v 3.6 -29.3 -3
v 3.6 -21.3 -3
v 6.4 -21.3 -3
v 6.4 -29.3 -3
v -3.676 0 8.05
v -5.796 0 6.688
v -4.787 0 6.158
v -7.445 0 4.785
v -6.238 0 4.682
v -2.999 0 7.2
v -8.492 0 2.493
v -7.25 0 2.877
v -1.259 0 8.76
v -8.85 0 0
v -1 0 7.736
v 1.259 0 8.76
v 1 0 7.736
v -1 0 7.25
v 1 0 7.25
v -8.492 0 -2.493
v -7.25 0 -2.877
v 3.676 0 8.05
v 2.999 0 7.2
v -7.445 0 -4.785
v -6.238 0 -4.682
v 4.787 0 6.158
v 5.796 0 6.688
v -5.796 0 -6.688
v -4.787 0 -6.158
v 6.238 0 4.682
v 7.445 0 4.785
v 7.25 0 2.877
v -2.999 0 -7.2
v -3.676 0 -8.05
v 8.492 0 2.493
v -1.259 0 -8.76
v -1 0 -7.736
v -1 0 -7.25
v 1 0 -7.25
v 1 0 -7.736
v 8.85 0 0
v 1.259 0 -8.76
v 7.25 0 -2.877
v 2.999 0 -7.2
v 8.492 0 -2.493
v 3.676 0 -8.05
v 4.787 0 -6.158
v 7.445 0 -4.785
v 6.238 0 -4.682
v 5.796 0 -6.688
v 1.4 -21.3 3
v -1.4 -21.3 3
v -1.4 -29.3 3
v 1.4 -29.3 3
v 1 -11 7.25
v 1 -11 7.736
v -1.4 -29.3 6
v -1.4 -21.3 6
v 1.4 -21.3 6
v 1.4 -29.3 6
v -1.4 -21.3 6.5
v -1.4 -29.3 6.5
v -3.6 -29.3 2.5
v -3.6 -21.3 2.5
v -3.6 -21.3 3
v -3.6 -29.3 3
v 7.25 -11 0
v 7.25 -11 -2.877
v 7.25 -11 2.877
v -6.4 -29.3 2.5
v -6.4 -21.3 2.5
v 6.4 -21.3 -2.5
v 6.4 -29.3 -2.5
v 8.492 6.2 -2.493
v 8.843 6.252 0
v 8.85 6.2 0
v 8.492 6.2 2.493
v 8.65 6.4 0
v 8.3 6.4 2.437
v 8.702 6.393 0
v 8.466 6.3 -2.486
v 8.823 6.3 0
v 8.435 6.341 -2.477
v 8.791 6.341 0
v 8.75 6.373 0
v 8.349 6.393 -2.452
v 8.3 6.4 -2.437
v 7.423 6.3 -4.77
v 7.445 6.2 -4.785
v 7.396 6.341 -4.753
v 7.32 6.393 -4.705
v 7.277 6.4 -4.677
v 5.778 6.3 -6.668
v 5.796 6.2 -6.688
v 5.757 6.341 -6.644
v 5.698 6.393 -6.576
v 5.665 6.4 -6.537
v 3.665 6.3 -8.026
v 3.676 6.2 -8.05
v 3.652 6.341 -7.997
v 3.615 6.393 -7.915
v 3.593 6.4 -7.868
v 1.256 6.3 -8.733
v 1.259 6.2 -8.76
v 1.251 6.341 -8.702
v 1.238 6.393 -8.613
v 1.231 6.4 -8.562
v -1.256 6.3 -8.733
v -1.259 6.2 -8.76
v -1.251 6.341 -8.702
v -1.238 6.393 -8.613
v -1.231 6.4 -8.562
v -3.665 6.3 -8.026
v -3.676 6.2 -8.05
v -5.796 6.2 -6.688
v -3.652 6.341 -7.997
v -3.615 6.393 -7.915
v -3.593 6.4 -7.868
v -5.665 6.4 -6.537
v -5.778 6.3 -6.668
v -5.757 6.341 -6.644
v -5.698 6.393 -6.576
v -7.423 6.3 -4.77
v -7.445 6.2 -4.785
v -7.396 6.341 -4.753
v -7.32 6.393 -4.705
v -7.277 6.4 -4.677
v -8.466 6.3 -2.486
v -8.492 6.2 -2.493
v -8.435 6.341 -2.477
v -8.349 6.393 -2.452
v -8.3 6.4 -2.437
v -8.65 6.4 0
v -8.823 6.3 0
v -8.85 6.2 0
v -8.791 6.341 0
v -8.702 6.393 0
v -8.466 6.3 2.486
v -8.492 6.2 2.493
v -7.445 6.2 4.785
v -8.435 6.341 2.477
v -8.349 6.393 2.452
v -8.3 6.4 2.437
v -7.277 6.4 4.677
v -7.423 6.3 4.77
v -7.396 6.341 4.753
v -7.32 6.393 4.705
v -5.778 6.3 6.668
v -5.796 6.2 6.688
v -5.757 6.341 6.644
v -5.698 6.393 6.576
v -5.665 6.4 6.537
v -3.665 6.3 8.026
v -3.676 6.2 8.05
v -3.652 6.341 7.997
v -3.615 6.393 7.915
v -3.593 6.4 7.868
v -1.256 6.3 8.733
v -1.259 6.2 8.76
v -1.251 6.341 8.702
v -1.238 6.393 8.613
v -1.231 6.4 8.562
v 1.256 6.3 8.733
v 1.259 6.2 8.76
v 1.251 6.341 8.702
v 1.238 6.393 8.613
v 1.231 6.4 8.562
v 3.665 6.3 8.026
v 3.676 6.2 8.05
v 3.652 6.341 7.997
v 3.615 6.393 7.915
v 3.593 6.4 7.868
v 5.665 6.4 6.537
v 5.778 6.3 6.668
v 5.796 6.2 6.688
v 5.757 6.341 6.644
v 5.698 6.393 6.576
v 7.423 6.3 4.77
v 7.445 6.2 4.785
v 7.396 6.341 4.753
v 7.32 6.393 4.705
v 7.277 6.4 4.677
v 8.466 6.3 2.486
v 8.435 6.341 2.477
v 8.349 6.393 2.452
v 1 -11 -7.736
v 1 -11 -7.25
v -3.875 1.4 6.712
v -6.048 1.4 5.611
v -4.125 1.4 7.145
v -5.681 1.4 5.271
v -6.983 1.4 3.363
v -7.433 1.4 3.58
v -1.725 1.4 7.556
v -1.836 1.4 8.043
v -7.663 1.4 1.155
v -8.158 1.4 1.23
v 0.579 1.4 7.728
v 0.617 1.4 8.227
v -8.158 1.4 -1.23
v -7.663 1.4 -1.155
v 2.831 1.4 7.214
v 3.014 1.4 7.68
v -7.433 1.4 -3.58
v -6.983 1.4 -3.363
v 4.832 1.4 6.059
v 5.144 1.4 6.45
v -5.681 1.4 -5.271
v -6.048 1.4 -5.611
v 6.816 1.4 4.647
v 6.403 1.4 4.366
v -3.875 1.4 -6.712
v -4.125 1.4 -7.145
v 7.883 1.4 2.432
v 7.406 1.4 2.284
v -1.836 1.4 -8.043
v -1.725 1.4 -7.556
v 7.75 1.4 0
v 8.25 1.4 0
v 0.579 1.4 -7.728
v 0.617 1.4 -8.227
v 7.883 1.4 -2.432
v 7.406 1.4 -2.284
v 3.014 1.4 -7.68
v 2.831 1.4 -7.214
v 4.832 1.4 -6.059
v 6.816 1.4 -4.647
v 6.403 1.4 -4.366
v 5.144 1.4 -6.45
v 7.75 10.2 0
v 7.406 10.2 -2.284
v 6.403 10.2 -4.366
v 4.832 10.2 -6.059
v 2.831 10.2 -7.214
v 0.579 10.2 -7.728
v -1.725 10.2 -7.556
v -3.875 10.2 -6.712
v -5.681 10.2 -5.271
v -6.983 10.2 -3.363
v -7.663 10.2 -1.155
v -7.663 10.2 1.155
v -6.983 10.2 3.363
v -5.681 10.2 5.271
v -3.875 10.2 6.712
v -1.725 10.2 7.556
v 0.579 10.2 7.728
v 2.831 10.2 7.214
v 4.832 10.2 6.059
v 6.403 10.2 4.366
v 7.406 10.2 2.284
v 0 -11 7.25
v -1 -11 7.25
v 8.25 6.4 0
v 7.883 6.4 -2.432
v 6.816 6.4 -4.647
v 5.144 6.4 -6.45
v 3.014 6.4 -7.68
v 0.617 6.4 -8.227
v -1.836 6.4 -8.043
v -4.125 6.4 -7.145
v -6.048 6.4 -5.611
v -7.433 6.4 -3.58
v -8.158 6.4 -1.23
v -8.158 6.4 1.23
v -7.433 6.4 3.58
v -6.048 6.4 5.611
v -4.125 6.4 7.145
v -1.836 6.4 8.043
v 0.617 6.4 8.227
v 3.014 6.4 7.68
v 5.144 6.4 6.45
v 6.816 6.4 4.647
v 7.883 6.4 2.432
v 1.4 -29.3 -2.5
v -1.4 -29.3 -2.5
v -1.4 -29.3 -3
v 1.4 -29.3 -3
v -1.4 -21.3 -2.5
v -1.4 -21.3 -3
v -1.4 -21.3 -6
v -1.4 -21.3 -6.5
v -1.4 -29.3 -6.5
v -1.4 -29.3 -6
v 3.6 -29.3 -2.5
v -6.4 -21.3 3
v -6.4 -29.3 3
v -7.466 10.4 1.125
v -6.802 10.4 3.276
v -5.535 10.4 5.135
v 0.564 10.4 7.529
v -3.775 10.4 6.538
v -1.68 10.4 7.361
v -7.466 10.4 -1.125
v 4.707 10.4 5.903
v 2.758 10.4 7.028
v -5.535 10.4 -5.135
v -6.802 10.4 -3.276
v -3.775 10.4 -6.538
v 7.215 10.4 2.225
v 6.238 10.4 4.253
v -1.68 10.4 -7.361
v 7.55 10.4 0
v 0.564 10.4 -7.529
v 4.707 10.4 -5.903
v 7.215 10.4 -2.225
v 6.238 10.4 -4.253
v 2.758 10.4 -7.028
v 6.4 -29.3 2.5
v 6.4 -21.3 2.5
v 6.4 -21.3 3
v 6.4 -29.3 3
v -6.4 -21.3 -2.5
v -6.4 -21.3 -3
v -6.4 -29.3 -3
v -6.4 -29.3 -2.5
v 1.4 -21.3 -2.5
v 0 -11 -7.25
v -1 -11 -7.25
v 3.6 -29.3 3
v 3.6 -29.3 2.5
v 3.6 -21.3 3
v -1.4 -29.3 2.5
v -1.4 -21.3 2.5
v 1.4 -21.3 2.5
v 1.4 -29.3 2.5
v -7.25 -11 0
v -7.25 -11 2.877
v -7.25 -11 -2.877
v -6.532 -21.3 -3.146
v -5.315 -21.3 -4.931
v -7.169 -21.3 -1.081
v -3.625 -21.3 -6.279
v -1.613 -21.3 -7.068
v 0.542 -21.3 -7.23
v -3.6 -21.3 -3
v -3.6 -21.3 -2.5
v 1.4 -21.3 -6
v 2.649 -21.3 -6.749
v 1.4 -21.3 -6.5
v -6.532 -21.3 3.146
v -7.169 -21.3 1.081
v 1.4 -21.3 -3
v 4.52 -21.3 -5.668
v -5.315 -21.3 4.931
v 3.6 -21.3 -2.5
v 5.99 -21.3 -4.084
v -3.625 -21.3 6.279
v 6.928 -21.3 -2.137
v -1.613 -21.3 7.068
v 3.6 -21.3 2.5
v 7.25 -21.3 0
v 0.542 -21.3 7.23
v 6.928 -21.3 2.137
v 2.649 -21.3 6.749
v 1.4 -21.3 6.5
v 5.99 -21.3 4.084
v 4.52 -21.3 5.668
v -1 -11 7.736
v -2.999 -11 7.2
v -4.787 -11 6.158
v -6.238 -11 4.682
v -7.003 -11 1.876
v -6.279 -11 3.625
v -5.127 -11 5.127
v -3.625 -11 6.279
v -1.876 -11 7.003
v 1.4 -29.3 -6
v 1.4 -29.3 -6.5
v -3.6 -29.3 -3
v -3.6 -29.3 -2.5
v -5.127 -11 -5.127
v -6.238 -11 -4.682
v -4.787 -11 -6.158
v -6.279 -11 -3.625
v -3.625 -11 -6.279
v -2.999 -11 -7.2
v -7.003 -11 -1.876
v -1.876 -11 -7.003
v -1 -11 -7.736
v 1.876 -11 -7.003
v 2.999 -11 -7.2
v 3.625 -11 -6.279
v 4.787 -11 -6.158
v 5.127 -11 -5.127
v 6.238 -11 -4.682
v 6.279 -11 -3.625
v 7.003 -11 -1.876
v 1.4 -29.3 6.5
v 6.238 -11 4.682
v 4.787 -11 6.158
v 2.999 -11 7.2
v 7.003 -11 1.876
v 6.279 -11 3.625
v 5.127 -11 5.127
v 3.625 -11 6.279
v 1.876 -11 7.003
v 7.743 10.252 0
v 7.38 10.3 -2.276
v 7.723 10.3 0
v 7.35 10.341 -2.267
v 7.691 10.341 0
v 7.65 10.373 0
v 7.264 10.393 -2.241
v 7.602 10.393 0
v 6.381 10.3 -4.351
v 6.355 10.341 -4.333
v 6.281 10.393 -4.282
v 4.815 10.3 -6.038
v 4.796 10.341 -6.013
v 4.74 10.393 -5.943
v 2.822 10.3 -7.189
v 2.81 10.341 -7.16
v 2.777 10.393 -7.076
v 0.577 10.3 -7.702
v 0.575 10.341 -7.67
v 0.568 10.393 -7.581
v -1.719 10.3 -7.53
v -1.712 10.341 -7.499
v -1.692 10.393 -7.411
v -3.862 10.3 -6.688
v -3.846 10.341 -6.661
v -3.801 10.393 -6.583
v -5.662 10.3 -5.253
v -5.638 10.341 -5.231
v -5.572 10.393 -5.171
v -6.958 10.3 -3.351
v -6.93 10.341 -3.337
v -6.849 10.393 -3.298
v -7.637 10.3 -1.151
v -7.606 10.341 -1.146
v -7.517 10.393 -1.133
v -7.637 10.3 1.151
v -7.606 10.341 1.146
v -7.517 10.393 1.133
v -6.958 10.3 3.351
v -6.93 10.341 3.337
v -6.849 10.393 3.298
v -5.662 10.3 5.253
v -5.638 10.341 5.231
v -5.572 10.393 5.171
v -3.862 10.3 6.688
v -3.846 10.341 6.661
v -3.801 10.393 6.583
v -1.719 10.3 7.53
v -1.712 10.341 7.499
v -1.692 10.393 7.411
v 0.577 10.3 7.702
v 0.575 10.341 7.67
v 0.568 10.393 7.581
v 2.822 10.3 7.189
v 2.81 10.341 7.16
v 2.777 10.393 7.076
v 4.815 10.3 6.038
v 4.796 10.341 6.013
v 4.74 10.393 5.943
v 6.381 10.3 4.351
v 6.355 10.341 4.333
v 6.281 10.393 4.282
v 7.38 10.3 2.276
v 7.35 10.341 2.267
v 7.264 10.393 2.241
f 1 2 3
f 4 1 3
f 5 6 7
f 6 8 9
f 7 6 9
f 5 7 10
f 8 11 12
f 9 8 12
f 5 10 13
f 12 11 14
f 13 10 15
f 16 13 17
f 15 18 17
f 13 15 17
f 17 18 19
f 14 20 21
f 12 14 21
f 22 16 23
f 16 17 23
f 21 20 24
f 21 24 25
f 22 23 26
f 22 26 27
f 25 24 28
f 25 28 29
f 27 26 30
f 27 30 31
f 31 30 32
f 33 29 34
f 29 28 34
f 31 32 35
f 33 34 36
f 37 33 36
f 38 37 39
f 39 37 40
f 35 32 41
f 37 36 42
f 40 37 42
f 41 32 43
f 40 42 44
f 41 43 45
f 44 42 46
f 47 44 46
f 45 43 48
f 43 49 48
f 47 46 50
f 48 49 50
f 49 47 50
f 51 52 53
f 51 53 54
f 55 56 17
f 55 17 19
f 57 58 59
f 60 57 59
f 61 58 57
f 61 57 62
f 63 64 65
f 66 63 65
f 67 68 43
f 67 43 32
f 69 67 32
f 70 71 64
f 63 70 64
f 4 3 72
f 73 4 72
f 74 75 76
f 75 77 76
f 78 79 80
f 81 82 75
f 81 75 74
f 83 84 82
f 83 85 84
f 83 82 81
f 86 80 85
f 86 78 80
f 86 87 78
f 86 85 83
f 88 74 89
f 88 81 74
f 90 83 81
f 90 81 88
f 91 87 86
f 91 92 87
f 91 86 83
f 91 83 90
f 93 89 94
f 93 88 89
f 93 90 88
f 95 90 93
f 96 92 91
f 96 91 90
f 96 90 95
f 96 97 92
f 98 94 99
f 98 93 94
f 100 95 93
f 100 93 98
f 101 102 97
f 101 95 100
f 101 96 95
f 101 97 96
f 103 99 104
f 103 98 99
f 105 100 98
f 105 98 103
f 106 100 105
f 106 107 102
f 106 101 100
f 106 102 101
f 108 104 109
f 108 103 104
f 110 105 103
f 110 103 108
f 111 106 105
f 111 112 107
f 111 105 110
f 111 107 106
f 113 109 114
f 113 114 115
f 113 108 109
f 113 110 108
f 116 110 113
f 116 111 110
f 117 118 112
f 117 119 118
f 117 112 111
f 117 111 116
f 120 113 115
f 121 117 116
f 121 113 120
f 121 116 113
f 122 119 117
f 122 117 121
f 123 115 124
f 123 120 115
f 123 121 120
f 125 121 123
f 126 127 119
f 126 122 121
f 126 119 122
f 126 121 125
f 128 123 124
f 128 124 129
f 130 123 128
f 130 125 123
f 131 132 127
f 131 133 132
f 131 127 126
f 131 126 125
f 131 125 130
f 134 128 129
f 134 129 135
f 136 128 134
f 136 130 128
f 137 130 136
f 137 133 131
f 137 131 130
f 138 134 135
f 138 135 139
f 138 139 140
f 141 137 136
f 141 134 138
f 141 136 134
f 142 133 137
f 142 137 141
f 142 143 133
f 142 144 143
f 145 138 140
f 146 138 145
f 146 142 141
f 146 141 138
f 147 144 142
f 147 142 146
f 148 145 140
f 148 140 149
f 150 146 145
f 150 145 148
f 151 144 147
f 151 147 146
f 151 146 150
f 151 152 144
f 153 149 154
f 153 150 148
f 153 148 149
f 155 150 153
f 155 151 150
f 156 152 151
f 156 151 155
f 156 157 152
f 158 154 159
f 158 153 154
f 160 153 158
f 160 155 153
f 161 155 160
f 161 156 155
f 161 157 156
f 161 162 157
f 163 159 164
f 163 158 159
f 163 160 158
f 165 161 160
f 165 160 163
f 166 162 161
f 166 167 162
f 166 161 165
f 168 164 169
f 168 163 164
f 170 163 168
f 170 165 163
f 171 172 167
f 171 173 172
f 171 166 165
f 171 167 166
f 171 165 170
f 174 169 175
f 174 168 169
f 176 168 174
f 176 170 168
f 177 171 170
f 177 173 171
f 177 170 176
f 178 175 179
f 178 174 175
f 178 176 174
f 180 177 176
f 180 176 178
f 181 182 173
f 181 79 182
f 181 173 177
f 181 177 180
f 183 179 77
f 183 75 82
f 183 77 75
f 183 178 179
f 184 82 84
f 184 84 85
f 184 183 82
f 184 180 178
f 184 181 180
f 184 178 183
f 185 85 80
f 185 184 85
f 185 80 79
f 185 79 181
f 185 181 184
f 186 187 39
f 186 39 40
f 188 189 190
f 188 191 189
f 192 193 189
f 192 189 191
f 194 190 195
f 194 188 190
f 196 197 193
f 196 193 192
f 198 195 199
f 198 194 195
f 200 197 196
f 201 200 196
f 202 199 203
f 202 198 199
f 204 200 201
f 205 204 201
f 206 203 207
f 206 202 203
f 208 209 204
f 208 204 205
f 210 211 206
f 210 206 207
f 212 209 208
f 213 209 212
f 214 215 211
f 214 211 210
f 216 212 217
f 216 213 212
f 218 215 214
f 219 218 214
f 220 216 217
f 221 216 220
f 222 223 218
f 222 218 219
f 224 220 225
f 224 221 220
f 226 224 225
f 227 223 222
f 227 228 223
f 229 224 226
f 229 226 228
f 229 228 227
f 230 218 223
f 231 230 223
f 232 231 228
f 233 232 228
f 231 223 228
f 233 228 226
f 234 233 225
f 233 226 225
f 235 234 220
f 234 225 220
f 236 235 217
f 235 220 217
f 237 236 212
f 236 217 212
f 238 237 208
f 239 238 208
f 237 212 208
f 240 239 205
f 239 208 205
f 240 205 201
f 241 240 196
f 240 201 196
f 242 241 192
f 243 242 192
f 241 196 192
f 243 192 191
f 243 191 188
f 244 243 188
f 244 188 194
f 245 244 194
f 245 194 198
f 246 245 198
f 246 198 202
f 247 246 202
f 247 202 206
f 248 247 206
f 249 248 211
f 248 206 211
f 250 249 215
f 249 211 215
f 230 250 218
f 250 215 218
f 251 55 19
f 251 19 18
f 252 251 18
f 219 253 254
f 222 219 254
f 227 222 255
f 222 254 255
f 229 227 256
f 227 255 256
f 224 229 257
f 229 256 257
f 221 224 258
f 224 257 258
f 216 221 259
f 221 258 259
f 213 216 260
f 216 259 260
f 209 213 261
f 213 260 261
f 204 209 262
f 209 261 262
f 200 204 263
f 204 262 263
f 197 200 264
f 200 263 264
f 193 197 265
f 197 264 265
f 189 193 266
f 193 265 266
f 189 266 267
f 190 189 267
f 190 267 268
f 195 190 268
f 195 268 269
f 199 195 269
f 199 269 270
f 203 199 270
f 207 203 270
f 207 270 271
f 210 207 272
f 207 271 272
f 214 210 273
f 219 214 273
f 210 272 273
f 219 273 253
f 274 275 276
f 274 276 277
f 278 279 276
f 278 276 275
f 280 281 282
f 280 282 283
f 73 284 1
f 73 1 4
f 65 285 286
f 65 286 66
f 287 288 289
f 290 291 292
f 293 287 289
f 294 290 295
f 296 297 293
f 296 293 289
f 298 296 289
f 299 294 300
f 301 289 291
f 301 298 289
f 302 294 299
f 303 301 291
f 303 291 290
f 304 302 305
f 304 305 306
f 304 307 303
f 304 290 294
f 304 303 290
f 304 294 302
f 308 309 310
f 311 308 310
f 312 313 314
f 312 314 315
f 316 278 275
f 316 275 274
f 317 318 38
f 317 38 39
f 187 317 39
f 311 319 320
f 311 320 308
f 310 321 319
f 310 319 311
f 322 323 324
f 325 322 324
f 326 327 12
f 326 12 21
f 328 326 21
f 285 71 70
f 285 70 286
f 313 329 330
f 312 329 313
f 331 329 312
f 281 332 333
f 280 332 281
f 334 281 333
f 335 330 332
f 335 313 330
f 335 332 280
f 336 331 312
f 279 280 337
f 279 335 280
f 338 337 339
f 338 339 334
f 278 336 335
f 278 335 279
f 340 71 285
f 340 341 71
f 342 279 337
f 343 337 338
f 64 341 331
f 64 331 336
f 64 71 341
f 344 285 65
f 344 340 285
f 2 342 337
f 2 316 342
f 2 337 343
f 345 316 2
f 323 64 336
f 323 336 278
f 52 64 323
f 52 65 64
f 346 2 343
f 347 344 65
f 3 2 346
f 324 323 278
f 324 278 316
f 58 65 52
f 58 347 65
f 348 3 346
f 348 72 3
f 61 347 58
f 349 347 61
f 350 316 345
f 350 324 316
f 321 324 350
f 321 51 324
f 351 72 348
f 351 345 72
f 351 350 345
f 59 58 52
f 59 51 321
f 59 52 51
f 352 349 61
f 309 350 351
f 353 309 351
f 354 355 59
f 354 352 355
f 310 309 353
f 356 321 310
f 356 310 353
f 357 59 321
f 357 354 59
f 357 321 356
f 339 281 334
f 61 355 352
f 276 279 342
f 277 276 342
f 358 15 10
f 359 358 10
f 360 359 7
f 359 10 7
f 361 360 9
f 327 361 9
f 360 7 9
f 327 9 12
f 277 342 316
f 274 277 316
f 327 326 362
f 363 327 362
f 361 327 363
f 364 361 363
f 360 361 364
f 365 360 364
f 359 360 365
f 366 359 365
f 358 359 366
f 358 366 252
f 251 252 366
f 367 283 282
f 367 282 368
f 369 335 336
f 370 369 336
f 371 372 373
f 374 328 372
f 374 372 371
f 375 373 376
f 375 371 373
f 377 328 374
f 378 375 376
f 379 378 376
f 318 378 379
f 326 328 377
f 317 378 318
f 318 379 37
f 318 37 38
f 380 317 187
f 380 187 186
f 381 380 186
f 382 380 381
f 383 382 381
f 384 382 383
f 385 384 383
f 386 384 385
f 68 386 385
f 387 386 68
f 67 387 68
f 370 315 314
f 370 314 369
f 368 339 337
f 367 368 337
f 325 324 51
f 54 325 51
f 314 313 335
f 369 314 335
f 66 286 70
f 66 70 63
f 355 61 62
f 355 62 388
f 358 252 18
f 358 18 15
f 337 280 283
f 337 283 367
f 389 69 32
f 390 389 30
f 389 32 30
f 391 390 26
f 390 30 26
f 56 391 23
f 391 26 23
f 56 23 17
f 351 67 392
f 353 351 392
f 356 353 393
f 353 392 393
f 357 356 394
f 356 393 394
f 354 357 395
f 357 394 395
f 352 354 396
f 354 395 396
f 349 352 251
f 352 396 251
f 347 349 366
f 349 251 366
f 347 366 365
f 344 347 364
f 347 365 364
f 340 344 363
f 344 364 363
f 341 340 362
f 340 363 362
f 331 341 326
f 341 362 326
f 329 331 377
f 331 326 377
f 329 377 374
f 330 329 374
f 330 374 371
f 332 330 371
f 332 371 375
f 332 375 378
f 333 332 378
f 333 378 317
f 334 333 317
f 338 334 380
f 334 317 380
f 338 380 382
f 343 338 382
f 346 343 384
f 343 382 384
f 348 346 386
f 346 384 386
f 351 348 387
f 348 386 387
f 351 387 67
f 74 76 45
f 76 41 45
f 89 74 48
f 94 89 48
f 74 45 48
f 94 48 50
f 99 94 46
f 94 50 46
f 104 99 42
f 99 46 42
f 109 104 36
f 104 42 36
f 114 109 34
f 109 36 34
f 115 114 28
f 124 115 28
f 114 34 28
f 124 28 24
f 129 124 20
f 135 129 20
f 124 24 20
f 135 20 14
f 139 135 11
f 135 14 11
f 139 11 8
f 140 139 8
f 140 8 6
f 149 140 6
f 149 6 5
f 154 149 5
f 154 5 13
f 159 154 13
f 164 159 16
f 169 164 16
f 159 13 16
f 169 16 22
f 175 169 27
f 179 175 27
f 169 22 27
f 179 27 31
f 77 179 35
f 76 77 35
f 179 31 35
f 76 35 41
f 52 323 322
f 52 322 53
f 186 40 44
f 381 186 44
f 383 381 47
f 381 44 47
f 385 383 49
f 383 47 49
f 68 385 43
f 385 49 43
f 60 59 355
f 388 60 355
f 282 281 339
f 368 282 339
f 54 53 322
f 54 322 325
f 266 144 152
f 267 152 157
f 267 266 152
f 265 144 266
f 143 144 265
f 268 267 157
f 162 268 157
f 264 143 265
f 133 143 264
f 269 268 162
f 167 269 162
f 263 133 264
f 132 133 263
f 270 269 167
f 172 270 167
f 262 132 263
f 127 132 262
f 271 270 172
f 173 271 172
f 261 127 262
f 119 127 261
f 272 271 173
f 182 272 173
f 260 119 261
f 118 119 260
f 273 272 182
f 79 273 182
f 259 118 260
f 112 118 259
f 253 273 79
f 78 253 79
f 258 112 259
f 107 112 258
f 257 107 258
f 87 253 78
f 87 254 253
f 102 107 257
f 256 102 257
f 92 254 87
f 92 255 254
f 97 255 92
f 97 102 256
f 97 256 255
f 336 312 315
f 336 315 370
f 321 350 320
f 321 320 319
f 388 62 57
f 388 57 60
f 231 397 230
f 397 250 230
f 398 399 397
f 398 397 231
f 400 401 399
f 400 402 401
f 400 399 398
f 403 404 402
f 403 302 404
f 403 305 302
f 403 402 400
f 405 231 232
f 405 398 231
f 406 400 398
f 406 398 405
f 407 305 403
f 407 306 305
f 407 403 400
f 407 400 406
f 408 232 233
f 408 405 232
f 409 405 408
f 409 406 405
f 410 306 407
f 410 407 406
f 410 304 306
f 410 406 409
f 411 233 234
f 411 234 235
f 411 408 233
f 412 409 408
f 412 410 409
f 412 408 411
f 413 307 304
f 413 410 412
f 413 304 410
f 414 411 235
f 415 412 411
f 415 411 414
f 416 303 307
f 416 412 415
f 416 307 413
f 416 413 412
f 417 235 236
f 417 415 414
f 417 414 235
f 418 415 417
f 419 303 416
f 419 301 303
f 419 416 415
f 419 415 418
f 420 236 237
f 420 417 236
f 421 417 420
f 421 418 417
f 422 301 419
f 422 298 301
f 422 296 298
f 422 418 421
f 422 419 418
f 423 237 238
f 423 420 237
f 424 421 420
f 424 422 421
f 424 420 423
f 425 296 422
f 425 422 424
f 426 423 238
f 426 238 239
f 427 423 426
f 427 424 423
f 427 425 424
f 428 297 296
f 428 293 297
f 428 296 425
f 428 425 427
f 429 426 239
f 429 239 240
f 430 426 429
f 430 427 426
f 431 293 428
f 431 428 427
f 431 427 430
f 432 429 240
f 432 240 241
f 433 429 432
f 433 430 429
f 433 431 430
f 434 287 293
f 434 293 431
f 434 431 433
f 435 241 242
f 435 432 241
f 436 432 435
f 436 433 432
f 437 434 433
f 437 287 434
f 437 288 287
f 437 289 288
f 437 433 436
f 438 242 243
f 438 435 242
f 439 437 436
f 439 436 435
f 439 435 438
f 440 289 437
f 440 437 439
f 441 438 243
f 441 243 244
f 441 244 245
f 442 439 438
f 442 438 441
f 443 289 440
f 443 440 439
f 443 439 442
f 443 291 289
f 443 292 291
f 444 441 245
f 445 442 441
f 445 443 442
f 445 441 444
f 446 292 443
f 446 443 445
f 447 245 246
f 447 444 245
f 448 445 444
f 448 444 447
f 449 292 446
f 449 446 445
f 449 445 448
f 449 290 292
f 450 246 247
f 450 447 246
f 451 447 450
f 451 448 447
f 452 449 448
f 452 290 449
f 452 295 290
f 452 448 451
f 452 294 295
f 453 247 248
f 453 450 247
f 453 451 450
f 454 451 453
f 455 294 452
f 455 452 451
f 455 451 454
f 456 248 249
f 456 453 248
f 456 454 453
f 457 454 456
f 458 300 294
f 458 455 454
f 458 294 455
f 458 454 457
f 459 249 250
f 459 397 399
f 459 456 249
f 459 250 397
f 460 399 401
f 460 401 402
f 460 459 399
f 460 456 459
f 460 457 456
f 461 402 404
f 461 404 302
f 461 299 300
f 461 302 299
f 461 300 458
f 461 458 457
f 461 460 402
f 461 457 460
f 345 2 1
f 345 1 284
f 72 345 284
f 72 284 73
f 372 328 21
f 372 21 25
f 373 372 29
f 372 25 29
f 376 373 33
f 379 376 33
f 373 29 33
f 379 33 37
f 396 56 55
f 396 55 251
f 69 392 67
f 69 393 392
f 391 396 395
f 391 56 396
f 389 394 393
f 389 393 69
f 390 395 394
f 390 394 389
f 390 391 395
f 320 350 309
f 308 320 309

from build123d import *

# Parameters (mm, degrees)
ESBO_O2_R                = 8.85
RESSALTO_EXTRUS_O1_DEPTH = 6.4
ESBO_O3_R                = 8.25
CORTE_EXTRUS_O1_DEPTH    = 5
ESBO_O4_R                = 7.75
RESSALTO_EXTRUS_O2_DEPTH = 9
FILETE1_R                = 0.2
ESBO_O5_R                = 7.8
RESSALTO_EXTRUS_O3_DEPTH = 11
ESBO_O6_R                = 7.25
RESSALTO_EXTRUS_O4_DEPTH = 10.3
ESBO_O7_W                = 21.473826642
ESBO_O7_H                = 23.10287556
CORTE_EXTRUS_O2_DEPTH    = 11
ESBO_O8_W                = 2.8
ESBO_O8_H                = 0.5
RESSALTO_EXTRUS_O5_DEPTH = 8


with BuildPart() as part:
    # Esboço2 → Ressalto-extrusão1 (new body)
    with BuildSketch(Plane(origin=(0, 0, 0), x_dir=(1, 0, 0), z_dir=(0, 1, 0))):
        Circle(ESBO_O2_R)
    extrude(amount=RESSALTO_EXTRUS_O1_DEPTH)

    # Esboço3 → Corte-extrusão1 (cut)
    with BuildSketch(Plane(origin=(0, 6.4, 0), x_dir=(1, 0, 0), z_dir=(0, 1, 0))):
        Circle(ESBO_O3_R)
    extrude(amount=-CORTE_EXTRUS_O1_DEPTH, mode=Mode.SUBTRACT)

    # Esboço4 → Ressalto-extrusão2 (add)
    with BuildSketch(Plane(origin=(0, 1.4, 0), x_dir=(1, 0, 0), z_dir=(0, 1, 0))):
        Circle(ESBO_O4_R)
    extrude(amount=RESSALTO_EXTRUS_O2_DEPTH)

    # Filete1
    filete1_edges = [part.edges().sort_by_distance(p)[0] for p in [
        (-7.75, 10.4, 0),
        (-8.85, 6.4, 0),
    ]]
    fillet(filete1_edges, radius=FILETE1_R)

    # Esboço5 → Ressalto-extrusão3 (add)
    with BuildSketch(Plane.XZ):
        Circle(ESBO_O5_R)
    extrude(amount=RESSALTO_EXTRUS_O3_DEPTH)

    # Esboço6 → Ressalto-extrusão4 (add)
    with BuildSketch(Plane.XZ.offset(11)):
        Circle(ESBO_O6_R)
    extrude(amount=RESSALTO_EXTRUS_O4_DEPTH)

    # Esboço7 → Corte-extrusão2 (cut)
    with BuildSketch(Plane.XZ.offset(11)):
        Rectangle(ESBO_O7_W, ESBO_O7_H)
        Polygon((-7.25, -7.8), (-1, -7.8), (-1, -7.25), (1, -7.25), (1, -7.8), (7.25, -7.8), (7.25, 7.8), (1, 7.8), (1, 7.25), (-1, 7.25), (-1, 7.8), (-7.25, 7.8), align=None, mode=Mode.SUBTRACT)
    extrude(amount=-CORTE_EXTRUS_O2_DEPTH, mode=Mode.SUBTRACT)

    # Esboço8 → Ressalto-extrusão5 (add)
    with BuildSketch(Plane.XZ.offset(21.3)):
        with Locations((-5, 2.75)):
            Rectangle(ESBO_O8_W, ESBO_O8_H)
        with Locations((0, 2.75)):
            Rectangle(ESBO_O8_W, ESBO_O8_H)
        with Locations((5, 2.75)):
            Rectangle(ESBO_O8_W, ESBO_O8_H)
        with Locations((0, 6.25)):
            Rectangle(ESBO_O8_W, ESBO_O8_H)
        with Locations((0, -6.25)):
            Rectangle(ESBO_O8_W, ESBO_O8_H)
        with Locations((5, -2.75)):
            Rectangle(ESBO_O8_W, ESBO_O8_H)
        with Locations((0, -2.75)):
            Rectangle(ESBO_O8_W, ESBO_O8_H)
        with Locations((-5, -2.75)):
            Rectangle(ESBO_O8_W, ESBO_O8_H)
    extrude(amount=RESSALTO_EXTRUS_O5_DEPTH)


solid = part.part
